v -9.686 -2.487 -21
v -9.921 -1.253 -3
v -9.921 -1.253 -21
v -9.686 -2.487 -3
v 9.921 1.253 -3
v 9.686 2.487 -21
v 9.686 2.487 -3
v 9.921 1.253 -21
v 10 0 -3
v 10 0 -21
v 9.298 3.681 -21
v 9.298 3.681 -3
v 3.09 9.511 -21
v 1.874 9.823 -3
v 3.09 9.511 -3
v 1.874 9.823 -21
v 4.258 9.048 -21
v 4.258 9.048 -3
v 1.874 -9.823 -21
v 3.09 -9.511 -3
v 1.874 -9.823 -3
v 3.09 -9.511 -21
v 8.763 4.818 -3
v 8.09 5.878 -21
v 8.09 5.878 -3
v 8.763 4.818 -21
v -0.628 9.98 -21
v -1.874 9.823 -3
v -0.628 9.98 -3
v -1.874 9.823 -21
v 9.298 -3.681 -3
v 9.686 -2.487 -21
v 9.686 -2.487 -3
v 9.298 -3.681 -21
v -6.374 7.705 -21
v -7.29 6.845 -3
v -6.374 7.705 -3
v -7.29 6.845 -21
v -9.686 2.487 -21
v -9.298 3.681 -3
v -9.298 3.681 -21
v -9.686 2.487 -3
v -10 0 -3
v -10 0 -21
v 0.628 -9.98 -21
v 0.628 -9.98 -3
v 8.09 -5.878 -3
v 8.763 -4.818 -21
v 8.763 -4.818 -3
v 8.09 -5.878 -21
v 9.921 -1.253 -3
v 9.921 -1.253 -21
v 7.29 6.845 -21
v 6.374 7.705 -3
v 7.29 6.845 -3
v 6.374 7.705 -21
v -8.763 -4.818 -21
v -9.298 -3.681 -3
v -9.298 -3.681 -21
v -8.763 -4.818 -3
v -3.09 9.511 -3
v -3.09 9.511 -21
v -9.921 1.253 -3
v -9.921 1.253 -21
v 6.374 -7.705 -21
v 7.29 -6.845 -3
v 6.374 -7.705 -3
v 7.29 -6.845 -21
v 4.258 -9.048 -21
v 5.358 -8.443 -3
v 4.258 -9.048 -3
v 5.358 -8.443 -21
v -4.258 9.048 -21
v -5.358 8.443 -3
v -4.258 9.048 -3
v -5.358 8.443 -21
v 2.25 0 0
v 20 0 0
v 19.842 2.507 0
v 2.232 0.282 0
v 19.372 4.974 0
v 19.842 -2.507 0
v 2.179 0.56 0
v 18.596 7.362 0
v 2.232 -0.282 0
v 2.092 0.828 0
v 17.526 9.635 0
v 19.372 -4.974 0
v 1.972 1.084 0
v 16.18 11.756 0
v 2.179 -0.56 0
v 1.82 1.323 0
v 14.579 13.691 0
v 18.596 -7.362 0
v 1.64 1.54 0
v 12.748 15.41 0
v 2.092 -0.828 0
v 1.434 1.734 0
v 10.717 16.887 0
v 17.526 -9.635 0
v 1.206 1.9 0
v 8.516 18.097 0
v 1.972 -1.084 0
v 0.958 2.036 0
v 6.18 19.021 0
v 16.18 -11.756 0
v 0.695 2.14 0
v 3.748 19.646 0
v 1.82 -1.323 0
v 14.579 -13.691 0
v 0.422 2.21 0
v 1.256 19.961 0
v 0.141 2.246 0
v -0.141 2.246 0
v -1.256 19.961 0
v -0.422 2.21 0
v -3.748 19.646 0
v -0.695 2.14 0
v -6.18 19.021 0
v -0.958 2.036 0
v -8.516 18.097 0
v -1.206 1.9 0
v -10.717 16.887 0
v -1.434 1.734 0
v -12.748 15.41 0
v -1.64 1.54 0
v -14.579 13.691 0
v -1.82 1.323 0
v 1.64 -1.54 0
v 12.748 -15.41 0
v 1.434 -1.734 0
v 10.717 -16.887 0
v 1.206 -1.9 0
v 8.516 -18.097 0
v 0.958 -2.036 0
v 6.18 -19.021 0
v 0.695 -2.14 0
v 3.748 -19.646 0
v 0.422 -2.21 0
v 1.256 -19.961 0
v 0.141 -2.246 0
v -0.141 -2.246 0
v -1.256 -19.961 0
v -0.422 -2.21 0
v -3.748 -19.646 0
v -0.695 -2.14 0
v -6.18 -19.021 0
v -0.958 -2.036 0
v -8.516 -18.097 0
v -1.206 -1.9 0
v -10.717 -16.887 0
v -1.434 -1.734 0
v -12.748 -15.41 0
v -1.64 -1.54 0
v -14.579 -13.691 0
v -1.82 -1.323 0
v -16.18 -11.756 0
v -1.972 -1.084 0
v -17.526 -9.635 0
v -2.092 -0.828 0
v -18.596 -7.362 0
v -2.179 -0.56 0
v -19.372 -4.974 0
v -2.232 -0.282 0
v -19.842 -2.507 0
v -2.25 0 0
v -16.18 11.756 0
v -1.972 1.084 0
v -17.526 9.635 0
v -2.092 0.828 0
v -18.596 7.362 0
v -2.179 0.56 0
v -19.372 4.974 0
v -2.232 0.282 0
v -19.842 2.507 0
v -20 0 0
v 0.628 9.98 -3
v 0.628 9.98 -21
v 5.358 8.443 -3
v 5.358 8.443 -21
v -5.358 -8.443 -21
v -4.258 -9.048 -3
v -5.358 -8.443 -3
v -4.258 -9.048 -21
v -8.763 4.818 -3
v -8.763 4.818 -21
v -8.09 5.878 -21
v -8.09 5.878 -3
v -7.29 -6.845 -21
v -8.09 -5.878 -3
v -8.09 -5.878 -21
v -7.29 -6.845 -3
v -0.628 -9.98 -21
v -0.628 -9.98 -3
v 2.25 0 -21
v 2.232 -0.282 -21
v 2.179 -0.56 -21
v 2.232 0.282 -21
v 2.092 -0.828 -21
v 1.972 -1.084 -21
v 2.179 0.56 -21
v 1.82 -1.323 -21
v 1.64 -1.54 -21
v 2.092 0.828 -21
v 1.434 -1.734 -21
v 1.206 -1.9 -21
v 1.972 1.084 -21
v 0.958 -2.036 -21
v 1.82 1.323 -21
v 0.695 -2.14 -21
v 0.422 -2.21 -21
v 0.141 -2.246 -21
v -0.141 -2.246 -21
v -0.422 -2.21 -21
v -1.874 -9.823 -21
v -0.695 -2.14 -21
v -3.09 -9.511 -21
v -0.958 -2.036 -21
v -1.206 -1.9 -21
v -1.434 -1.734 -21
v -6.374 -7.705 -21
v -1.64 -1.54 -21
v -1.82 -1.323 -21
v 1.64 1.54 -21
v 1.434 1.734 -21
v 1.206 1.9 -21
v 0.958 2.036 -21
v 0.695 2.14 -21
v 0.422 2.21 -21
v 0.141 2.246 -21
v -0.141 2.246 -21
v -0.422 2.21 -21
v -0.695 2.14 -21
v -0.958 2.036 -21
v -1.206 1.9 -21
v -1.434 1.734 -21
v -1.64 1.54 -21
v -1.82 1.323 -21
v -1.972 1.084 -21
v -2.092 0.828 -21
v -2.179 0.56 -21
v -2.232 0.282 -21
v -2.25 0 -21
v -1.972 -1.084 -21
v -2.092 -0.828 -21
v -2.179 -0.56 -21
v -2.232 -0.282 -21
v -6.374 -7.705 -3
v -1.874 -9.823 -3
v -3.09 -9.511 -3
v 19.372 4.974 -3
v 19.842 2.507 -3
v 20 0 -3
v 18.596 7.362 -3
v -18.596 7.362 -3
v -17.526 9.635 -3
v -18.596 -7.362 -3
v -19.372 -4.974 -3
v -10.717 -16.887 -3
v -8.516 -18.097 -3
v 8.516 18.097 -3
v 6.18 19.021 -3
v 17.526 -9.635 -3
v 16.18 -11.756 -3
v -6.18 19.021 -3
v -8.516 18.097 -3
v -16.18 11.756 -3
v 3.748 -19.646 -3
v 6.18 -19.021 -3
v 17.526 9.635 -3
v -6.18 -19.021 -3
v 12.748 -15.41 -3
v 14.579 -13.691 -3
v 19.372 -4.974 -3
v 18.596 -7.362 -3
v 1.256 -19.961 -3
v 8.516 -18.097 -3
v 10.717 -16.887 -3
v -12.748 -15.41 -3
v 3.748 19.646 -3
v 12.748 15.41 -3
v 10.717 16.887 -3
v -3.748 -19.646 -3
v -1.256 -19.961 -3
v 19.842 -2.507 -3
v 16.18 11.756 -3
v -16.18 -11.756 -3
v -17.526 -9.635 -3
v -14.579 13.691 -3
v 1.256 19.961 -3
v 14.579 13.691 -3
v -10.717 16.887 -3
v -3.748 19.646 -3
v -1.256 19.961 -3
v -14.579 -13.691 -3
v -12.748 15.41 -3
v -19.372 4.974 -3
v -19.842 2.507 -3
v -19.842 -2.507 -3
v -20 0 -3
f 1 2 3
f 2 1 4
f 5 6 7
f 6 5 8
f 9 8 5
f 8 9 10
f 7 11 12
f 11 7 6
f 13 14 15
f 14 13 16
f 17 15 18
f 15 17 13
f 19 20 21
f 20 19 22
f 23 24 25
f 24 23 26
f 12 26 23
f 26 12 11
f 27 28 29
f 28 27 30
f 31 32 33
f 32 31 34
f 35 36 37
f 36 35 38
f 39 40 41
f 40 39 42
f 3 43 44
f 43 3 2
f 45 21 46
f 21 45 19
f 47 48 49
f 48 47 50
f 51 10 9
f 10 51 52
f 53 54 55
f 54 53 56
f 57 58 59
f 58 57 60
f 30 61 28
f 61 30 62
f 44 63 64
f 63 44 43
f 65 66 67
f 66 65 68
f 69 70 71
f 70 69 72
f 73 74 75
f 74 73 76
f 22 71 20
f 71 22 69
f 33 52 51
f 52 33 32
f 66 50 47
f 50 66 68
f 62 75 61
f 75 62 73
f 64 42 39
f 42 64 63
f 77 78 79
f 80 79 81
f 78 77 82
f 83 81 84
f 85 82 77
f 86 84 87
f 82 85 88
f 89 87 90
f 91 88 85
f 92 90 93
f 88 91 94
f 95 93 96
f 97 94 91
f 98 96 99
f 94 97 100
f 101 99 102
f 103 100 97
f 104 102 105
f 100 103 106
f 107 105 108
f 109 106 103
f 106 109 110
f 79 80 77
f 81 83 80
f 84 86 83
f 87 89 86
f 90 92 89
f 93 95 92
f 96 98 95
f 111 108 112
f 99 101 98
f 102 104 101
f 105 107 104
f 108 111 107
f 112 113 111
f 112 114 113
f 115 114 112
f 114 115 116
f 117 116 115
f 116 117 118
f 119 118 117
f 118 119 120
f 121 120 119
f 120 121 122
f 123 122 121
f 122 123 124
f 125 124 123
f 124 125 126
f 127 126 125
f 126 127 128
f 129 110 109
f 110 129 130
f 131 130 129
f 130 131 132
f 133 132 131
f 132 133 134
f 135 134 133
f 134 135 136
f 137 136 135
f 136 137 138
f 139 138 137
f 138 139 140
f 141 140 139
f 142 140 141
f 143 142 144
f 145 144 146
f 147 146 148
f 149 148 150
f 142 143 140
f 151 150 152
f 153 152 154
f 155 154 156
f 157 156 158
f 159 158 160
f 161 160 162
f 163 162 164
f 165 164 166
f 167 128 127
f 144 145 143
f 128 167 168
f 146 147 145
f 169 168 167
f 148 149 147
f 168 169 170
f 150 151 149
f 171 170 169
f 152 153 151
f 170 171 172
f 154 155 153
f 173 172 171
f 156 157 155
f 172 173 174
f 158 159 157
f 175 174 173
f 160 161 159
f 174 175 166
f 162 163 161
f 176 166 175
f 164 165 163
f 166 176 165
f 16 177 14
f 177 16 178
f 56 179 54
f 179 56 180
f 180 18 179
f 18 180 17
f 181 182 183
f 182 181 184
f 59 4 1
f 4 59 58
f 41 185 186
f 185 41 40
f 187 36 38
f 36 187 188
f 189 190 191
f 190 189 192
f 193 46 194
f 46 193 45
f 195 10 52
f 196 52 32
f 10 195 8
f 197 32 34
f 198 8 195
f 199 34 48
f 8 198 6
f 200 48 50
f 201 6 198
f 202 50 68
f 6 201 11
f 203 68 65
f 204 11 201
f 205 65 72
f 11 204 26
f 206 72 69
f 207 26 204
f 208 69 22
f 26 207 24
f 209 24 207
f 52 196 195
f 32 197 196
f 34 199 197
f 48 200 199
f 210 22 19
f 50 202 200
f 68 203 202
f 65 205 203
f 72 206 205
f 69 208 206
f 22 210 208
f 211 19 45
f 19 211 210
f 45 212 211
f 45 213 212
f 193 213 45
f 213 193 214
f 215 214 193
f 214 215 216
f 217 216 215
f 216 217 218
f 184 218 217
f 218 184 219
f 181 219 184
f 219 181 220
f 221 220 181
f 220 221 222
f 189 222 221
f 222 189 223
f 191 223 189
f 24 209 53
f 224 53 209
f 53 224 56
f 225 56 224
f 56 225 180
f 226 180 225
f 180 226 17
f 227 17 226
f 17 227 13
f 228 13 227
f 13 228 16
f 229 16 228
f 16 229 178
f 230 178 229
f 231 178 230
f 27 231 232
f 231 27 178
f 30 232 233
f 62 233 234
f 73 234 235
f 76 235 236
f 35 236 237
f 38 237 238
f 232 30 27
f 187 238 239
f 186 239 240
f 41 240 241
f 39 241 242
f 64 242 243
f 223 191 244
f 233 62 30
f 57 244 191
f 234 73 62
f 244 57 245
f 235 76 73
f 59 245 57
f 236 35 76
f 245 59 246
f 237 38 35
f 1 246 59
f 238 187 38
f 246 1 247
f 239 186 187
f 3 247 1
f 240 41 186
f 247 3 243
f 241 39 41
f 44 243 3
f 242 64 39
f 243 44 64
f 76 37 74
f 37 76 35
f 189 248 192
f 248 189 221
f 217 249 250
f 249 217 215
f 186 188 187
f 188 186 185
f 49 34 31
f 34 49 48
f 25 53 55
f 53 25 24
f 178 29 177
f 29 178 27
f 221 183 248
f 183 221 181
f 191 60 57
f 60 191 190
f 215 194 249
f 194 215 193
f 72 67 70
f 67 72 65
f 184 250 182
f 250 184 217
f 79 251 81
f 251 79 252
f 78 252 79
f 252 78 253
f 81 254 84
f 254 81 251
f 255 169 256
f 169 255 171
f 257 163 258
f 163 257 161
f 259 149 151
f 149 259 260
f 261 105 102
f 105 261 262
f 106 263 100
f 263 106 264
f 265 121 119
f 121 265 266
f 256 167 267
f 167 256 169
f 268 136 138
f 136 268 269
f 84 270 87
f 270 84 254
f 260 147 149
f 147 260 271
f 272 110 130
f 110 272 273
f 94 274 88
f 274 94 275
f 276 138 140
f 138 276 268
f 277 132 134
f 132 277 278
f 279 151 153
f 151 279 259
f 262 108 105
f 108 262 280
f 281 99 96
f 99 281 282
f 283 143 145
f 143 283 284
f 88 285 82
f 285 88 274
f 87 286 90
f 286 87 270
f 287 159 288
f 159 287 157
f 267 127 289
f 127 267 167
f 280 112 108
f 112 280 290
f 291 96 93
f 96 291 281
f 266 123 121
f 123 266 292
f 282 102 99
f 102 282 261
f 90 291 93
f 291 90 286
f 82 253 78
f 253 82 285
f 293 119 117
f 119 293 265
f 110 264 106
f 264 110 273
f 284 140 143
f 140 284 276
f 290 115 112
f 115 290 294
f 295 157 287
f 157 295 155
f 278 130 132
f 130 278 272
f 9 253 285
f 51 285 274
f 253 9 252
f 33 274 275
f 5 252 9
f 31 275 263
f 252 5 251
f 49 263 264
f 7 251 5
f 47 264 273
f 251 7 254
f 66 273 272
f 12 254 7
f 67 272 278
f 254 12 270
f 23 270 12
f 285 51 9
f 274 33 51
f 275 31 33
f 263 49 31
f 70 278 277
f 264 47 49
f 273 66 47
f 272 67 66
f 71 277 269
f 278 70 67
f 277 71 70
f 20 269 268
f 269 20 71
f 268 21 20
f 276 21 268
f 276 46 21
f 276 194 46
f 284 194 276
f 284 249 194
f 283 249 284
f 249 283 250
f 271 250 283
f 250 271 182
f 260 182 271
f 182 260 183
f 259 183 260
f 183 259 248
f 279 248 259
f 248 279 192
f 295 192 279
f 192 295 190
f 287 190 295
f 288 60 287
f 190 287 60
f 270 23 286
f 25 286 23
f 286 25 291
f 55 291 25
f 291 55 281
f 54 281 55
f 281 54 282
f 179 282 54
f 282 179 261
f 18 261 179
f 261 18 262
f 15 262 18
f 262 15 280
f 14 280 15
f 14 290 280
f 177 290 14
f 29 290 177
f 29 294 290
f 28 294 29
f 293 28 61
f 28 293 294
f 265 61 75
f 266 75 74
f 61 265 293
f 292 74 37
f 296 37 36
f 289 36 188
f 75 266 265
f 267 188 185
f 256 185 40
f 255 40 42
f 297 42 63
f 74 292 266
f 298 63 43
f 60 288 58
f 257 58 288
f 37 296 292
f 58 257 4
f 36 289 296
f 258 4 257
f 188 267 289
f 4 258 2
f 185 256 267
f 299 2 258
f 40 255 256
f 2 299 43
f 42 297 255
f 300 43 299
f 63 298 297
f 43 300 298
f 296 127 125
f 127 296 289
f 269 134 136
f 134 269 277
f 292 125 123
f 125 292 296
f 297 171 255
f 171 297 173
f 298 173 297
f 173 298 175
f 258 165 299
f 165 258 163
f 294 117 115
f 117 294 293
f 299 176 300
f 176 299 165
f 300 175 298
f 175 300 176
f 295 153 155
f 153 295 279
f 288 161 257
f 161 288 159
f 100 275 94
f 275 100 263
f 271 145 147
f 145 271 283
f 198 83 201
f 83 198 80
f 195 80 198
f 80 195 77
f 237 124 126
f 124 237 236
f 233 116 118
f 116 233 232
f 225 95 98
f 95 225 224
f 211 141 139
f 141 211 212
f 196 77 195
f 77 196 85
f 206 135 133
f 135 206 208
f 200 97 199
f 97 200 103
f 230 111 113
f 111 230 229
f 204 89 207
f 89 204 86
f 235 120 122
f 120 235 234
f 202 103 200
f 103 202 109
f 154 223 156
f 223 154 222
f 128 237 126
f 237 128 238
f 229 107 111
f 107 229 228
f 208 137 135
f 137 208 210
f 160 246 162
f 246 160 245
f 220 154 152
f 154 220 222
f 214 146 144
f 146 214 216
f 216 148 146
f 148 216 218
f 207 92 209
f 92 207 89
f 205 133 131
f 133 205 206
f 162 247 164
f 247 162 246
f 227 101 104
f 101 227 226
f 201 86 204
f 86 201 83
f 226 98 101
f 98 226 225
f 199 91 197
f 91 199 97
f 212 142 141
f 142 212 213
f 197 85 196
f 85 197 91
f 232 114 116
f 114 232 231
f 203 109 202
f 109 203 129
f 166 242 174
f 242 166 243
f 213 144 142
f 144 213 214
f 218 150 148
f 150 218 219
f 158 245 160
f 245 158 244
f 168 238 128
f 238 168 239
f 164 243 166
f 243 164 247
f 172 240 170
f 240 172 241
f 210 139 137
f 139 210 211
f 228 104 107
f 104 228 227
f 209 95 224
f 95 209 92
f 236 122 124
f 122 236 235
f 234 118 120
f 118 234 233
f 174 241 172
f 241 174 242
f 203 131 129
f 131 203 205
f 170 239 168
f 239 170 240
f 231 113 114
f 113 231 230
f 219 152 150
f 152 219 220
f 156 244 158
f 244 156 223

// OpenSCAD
$fn = 50;


difference() {
	union() {
		translate(v = [0, 0, -21.0000000000]) {
			cylinder(h = 21, r = 10.0000000000);
		}
		translate(v = [0, 0, -3.0000000000]) {
			cylinder(h = 3, r = 20.0000000000);
		}
	}
	union() {
		#translate(v = [0, 0, -21]) {
			cylinder(h = 21, r = 2.2500000000);
		}
	}
}
